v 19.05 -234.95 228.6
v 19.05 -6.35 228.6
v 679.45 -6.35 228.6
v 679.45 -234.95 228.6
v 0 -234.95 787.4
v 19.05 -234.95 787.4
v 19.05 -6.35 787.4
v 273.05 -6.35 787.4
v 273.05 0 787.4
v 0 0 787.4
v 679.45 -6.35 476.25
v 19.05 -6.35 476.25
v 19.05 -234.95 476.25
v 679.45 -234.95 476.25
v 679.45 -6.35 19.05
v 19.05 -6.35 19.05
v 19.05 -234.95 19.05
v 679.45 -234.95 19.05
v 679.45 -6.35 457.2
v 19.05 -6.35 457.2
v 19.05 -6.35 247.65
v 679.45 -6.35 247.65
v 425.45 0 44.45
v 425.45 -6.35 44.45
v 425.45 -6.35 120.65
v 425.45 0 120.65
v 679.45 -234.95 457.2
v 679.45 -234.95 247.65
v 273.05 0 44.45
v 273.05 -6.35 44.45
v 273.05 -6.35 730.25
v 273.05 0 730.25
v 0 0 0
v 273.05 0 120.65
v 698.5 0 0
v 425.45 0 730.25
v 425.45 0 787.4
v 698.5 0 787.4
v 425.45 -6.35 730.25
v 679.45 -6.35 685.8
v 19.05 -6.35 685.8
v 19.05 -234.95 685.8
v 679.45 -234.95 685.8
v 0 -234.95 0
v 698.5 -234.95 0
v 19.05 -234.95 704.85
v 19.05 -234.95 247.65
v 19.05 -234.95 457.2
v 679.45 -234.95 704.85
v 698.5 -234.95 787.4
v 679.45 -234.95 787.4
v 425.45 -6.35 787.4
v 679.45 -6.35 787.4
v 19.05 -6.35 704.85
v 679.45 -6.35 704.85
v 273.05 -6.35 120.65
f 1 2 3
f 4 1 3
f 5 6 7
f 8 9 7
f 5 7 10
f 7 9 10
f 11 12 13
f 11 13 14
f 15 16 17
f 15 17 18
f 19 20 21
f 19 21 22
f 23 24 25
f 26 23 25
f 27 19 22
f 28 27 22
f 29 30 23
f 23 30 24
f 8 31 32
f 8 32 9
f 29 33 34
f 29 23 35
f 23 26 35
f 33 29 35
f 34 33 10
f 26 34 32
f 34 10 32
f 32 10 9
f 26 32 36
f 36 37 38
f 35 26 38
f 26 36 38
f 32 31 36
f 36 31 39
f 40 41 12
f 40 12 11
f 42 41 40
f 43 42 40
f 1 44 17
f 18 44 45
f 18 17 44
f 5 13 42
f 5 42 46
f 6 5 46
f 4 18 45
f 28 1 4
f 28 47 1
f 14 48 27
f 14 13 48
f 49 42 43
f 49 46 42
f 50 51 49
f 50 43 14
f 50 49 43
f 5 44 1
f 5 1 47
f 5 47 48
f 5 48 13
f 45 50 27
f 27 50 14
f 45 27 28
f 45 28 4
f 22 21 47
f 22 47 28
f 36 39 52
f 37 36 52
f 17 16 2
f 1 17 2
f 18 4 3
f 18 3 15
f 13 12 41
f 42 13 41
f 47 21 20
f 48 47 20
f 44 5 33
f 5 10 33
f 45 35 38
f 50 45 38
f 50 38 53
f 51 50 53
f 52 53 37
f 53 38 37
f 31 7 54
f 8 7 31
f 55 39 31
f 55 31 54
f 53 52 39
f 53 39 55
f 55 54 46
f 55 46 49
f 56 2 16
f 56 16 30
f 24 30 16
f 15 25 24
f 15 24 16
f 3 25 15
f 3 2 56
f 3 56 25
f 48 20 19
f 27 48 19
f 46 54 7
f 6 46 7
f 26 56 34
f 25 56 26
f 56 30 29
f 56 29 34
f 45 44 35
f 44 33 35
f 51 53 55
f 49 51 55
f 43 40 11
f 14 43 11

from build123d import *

# Parameters (mm, degrees)
F0_W     = 698.5
F0_H     = 787.4
F1_DEPTH = 6.35
F2_W     = 660.4
F2_H     = 19.05
F3_DEPTH = 228.6
F4_W     = 152.4
F4_H     = 76.2
F5_DEPTH = 25.4


with BuildPart() as f1:
    # F0 (on Front) → F1 (new body)
    with BuildSketch(Plane.XZ):
        with Locations((349.25, 393.7)):
            Rectangle(F0_W, F0_H)
    extrude(amount=F1_DEPTH)

    # F2 (on face) → F3 (join)
    with BuildSketch(Plane.XZ.offset(6.35)):
        Polygon((19.05, 787.4), (0, 787.4), (0, 0), (19.05, 0), (19.05, 19.05), (19.05, 228.6), (19.05, 247.65), (19.05, 457.2), (19.05, 476.25), (19.05, 685.8), (19.05, 704.85), align=None)
        Polygon((698.5, 787.4), (679.45, 787.4), (679.45, 704.85), (679.45, 685.8), (679.45, 476.25), (679.45, 457.2), (679.45, 247.65), (679.45, 228.6), (679.45, 19.05), (679.45, 0), (698.5, 0), align=None)
        with Locations((349.25, 695.325)):
            Rectangle(F2_W, F2_H)
        with Locations((349.25, 466.725)):
            Rectangle(F2_W, F2_H)
        with Locations((349.25, 238.125)):
            Rectangle(F2_W, F2_H)
        with Locations((349.25, 9.525)):
            Rectangle(F2_W, F2_H)
    extrude(amount=F3_DEPTH)

    # F4 (on face) → F5 (cut)
    with BuildSketch(Plane.XZ.offset(6.35)):
        with Locations((349.25, 768.35)):
            Rectangle(F4_W, F4_H)
        with Locations((349.25, 82.55)):
            Rectangle(F4_W, F4_H)
    extrude(amount=-F5_DEPTH, mode=Mode.SUBTRACT)


solid = f1.part
